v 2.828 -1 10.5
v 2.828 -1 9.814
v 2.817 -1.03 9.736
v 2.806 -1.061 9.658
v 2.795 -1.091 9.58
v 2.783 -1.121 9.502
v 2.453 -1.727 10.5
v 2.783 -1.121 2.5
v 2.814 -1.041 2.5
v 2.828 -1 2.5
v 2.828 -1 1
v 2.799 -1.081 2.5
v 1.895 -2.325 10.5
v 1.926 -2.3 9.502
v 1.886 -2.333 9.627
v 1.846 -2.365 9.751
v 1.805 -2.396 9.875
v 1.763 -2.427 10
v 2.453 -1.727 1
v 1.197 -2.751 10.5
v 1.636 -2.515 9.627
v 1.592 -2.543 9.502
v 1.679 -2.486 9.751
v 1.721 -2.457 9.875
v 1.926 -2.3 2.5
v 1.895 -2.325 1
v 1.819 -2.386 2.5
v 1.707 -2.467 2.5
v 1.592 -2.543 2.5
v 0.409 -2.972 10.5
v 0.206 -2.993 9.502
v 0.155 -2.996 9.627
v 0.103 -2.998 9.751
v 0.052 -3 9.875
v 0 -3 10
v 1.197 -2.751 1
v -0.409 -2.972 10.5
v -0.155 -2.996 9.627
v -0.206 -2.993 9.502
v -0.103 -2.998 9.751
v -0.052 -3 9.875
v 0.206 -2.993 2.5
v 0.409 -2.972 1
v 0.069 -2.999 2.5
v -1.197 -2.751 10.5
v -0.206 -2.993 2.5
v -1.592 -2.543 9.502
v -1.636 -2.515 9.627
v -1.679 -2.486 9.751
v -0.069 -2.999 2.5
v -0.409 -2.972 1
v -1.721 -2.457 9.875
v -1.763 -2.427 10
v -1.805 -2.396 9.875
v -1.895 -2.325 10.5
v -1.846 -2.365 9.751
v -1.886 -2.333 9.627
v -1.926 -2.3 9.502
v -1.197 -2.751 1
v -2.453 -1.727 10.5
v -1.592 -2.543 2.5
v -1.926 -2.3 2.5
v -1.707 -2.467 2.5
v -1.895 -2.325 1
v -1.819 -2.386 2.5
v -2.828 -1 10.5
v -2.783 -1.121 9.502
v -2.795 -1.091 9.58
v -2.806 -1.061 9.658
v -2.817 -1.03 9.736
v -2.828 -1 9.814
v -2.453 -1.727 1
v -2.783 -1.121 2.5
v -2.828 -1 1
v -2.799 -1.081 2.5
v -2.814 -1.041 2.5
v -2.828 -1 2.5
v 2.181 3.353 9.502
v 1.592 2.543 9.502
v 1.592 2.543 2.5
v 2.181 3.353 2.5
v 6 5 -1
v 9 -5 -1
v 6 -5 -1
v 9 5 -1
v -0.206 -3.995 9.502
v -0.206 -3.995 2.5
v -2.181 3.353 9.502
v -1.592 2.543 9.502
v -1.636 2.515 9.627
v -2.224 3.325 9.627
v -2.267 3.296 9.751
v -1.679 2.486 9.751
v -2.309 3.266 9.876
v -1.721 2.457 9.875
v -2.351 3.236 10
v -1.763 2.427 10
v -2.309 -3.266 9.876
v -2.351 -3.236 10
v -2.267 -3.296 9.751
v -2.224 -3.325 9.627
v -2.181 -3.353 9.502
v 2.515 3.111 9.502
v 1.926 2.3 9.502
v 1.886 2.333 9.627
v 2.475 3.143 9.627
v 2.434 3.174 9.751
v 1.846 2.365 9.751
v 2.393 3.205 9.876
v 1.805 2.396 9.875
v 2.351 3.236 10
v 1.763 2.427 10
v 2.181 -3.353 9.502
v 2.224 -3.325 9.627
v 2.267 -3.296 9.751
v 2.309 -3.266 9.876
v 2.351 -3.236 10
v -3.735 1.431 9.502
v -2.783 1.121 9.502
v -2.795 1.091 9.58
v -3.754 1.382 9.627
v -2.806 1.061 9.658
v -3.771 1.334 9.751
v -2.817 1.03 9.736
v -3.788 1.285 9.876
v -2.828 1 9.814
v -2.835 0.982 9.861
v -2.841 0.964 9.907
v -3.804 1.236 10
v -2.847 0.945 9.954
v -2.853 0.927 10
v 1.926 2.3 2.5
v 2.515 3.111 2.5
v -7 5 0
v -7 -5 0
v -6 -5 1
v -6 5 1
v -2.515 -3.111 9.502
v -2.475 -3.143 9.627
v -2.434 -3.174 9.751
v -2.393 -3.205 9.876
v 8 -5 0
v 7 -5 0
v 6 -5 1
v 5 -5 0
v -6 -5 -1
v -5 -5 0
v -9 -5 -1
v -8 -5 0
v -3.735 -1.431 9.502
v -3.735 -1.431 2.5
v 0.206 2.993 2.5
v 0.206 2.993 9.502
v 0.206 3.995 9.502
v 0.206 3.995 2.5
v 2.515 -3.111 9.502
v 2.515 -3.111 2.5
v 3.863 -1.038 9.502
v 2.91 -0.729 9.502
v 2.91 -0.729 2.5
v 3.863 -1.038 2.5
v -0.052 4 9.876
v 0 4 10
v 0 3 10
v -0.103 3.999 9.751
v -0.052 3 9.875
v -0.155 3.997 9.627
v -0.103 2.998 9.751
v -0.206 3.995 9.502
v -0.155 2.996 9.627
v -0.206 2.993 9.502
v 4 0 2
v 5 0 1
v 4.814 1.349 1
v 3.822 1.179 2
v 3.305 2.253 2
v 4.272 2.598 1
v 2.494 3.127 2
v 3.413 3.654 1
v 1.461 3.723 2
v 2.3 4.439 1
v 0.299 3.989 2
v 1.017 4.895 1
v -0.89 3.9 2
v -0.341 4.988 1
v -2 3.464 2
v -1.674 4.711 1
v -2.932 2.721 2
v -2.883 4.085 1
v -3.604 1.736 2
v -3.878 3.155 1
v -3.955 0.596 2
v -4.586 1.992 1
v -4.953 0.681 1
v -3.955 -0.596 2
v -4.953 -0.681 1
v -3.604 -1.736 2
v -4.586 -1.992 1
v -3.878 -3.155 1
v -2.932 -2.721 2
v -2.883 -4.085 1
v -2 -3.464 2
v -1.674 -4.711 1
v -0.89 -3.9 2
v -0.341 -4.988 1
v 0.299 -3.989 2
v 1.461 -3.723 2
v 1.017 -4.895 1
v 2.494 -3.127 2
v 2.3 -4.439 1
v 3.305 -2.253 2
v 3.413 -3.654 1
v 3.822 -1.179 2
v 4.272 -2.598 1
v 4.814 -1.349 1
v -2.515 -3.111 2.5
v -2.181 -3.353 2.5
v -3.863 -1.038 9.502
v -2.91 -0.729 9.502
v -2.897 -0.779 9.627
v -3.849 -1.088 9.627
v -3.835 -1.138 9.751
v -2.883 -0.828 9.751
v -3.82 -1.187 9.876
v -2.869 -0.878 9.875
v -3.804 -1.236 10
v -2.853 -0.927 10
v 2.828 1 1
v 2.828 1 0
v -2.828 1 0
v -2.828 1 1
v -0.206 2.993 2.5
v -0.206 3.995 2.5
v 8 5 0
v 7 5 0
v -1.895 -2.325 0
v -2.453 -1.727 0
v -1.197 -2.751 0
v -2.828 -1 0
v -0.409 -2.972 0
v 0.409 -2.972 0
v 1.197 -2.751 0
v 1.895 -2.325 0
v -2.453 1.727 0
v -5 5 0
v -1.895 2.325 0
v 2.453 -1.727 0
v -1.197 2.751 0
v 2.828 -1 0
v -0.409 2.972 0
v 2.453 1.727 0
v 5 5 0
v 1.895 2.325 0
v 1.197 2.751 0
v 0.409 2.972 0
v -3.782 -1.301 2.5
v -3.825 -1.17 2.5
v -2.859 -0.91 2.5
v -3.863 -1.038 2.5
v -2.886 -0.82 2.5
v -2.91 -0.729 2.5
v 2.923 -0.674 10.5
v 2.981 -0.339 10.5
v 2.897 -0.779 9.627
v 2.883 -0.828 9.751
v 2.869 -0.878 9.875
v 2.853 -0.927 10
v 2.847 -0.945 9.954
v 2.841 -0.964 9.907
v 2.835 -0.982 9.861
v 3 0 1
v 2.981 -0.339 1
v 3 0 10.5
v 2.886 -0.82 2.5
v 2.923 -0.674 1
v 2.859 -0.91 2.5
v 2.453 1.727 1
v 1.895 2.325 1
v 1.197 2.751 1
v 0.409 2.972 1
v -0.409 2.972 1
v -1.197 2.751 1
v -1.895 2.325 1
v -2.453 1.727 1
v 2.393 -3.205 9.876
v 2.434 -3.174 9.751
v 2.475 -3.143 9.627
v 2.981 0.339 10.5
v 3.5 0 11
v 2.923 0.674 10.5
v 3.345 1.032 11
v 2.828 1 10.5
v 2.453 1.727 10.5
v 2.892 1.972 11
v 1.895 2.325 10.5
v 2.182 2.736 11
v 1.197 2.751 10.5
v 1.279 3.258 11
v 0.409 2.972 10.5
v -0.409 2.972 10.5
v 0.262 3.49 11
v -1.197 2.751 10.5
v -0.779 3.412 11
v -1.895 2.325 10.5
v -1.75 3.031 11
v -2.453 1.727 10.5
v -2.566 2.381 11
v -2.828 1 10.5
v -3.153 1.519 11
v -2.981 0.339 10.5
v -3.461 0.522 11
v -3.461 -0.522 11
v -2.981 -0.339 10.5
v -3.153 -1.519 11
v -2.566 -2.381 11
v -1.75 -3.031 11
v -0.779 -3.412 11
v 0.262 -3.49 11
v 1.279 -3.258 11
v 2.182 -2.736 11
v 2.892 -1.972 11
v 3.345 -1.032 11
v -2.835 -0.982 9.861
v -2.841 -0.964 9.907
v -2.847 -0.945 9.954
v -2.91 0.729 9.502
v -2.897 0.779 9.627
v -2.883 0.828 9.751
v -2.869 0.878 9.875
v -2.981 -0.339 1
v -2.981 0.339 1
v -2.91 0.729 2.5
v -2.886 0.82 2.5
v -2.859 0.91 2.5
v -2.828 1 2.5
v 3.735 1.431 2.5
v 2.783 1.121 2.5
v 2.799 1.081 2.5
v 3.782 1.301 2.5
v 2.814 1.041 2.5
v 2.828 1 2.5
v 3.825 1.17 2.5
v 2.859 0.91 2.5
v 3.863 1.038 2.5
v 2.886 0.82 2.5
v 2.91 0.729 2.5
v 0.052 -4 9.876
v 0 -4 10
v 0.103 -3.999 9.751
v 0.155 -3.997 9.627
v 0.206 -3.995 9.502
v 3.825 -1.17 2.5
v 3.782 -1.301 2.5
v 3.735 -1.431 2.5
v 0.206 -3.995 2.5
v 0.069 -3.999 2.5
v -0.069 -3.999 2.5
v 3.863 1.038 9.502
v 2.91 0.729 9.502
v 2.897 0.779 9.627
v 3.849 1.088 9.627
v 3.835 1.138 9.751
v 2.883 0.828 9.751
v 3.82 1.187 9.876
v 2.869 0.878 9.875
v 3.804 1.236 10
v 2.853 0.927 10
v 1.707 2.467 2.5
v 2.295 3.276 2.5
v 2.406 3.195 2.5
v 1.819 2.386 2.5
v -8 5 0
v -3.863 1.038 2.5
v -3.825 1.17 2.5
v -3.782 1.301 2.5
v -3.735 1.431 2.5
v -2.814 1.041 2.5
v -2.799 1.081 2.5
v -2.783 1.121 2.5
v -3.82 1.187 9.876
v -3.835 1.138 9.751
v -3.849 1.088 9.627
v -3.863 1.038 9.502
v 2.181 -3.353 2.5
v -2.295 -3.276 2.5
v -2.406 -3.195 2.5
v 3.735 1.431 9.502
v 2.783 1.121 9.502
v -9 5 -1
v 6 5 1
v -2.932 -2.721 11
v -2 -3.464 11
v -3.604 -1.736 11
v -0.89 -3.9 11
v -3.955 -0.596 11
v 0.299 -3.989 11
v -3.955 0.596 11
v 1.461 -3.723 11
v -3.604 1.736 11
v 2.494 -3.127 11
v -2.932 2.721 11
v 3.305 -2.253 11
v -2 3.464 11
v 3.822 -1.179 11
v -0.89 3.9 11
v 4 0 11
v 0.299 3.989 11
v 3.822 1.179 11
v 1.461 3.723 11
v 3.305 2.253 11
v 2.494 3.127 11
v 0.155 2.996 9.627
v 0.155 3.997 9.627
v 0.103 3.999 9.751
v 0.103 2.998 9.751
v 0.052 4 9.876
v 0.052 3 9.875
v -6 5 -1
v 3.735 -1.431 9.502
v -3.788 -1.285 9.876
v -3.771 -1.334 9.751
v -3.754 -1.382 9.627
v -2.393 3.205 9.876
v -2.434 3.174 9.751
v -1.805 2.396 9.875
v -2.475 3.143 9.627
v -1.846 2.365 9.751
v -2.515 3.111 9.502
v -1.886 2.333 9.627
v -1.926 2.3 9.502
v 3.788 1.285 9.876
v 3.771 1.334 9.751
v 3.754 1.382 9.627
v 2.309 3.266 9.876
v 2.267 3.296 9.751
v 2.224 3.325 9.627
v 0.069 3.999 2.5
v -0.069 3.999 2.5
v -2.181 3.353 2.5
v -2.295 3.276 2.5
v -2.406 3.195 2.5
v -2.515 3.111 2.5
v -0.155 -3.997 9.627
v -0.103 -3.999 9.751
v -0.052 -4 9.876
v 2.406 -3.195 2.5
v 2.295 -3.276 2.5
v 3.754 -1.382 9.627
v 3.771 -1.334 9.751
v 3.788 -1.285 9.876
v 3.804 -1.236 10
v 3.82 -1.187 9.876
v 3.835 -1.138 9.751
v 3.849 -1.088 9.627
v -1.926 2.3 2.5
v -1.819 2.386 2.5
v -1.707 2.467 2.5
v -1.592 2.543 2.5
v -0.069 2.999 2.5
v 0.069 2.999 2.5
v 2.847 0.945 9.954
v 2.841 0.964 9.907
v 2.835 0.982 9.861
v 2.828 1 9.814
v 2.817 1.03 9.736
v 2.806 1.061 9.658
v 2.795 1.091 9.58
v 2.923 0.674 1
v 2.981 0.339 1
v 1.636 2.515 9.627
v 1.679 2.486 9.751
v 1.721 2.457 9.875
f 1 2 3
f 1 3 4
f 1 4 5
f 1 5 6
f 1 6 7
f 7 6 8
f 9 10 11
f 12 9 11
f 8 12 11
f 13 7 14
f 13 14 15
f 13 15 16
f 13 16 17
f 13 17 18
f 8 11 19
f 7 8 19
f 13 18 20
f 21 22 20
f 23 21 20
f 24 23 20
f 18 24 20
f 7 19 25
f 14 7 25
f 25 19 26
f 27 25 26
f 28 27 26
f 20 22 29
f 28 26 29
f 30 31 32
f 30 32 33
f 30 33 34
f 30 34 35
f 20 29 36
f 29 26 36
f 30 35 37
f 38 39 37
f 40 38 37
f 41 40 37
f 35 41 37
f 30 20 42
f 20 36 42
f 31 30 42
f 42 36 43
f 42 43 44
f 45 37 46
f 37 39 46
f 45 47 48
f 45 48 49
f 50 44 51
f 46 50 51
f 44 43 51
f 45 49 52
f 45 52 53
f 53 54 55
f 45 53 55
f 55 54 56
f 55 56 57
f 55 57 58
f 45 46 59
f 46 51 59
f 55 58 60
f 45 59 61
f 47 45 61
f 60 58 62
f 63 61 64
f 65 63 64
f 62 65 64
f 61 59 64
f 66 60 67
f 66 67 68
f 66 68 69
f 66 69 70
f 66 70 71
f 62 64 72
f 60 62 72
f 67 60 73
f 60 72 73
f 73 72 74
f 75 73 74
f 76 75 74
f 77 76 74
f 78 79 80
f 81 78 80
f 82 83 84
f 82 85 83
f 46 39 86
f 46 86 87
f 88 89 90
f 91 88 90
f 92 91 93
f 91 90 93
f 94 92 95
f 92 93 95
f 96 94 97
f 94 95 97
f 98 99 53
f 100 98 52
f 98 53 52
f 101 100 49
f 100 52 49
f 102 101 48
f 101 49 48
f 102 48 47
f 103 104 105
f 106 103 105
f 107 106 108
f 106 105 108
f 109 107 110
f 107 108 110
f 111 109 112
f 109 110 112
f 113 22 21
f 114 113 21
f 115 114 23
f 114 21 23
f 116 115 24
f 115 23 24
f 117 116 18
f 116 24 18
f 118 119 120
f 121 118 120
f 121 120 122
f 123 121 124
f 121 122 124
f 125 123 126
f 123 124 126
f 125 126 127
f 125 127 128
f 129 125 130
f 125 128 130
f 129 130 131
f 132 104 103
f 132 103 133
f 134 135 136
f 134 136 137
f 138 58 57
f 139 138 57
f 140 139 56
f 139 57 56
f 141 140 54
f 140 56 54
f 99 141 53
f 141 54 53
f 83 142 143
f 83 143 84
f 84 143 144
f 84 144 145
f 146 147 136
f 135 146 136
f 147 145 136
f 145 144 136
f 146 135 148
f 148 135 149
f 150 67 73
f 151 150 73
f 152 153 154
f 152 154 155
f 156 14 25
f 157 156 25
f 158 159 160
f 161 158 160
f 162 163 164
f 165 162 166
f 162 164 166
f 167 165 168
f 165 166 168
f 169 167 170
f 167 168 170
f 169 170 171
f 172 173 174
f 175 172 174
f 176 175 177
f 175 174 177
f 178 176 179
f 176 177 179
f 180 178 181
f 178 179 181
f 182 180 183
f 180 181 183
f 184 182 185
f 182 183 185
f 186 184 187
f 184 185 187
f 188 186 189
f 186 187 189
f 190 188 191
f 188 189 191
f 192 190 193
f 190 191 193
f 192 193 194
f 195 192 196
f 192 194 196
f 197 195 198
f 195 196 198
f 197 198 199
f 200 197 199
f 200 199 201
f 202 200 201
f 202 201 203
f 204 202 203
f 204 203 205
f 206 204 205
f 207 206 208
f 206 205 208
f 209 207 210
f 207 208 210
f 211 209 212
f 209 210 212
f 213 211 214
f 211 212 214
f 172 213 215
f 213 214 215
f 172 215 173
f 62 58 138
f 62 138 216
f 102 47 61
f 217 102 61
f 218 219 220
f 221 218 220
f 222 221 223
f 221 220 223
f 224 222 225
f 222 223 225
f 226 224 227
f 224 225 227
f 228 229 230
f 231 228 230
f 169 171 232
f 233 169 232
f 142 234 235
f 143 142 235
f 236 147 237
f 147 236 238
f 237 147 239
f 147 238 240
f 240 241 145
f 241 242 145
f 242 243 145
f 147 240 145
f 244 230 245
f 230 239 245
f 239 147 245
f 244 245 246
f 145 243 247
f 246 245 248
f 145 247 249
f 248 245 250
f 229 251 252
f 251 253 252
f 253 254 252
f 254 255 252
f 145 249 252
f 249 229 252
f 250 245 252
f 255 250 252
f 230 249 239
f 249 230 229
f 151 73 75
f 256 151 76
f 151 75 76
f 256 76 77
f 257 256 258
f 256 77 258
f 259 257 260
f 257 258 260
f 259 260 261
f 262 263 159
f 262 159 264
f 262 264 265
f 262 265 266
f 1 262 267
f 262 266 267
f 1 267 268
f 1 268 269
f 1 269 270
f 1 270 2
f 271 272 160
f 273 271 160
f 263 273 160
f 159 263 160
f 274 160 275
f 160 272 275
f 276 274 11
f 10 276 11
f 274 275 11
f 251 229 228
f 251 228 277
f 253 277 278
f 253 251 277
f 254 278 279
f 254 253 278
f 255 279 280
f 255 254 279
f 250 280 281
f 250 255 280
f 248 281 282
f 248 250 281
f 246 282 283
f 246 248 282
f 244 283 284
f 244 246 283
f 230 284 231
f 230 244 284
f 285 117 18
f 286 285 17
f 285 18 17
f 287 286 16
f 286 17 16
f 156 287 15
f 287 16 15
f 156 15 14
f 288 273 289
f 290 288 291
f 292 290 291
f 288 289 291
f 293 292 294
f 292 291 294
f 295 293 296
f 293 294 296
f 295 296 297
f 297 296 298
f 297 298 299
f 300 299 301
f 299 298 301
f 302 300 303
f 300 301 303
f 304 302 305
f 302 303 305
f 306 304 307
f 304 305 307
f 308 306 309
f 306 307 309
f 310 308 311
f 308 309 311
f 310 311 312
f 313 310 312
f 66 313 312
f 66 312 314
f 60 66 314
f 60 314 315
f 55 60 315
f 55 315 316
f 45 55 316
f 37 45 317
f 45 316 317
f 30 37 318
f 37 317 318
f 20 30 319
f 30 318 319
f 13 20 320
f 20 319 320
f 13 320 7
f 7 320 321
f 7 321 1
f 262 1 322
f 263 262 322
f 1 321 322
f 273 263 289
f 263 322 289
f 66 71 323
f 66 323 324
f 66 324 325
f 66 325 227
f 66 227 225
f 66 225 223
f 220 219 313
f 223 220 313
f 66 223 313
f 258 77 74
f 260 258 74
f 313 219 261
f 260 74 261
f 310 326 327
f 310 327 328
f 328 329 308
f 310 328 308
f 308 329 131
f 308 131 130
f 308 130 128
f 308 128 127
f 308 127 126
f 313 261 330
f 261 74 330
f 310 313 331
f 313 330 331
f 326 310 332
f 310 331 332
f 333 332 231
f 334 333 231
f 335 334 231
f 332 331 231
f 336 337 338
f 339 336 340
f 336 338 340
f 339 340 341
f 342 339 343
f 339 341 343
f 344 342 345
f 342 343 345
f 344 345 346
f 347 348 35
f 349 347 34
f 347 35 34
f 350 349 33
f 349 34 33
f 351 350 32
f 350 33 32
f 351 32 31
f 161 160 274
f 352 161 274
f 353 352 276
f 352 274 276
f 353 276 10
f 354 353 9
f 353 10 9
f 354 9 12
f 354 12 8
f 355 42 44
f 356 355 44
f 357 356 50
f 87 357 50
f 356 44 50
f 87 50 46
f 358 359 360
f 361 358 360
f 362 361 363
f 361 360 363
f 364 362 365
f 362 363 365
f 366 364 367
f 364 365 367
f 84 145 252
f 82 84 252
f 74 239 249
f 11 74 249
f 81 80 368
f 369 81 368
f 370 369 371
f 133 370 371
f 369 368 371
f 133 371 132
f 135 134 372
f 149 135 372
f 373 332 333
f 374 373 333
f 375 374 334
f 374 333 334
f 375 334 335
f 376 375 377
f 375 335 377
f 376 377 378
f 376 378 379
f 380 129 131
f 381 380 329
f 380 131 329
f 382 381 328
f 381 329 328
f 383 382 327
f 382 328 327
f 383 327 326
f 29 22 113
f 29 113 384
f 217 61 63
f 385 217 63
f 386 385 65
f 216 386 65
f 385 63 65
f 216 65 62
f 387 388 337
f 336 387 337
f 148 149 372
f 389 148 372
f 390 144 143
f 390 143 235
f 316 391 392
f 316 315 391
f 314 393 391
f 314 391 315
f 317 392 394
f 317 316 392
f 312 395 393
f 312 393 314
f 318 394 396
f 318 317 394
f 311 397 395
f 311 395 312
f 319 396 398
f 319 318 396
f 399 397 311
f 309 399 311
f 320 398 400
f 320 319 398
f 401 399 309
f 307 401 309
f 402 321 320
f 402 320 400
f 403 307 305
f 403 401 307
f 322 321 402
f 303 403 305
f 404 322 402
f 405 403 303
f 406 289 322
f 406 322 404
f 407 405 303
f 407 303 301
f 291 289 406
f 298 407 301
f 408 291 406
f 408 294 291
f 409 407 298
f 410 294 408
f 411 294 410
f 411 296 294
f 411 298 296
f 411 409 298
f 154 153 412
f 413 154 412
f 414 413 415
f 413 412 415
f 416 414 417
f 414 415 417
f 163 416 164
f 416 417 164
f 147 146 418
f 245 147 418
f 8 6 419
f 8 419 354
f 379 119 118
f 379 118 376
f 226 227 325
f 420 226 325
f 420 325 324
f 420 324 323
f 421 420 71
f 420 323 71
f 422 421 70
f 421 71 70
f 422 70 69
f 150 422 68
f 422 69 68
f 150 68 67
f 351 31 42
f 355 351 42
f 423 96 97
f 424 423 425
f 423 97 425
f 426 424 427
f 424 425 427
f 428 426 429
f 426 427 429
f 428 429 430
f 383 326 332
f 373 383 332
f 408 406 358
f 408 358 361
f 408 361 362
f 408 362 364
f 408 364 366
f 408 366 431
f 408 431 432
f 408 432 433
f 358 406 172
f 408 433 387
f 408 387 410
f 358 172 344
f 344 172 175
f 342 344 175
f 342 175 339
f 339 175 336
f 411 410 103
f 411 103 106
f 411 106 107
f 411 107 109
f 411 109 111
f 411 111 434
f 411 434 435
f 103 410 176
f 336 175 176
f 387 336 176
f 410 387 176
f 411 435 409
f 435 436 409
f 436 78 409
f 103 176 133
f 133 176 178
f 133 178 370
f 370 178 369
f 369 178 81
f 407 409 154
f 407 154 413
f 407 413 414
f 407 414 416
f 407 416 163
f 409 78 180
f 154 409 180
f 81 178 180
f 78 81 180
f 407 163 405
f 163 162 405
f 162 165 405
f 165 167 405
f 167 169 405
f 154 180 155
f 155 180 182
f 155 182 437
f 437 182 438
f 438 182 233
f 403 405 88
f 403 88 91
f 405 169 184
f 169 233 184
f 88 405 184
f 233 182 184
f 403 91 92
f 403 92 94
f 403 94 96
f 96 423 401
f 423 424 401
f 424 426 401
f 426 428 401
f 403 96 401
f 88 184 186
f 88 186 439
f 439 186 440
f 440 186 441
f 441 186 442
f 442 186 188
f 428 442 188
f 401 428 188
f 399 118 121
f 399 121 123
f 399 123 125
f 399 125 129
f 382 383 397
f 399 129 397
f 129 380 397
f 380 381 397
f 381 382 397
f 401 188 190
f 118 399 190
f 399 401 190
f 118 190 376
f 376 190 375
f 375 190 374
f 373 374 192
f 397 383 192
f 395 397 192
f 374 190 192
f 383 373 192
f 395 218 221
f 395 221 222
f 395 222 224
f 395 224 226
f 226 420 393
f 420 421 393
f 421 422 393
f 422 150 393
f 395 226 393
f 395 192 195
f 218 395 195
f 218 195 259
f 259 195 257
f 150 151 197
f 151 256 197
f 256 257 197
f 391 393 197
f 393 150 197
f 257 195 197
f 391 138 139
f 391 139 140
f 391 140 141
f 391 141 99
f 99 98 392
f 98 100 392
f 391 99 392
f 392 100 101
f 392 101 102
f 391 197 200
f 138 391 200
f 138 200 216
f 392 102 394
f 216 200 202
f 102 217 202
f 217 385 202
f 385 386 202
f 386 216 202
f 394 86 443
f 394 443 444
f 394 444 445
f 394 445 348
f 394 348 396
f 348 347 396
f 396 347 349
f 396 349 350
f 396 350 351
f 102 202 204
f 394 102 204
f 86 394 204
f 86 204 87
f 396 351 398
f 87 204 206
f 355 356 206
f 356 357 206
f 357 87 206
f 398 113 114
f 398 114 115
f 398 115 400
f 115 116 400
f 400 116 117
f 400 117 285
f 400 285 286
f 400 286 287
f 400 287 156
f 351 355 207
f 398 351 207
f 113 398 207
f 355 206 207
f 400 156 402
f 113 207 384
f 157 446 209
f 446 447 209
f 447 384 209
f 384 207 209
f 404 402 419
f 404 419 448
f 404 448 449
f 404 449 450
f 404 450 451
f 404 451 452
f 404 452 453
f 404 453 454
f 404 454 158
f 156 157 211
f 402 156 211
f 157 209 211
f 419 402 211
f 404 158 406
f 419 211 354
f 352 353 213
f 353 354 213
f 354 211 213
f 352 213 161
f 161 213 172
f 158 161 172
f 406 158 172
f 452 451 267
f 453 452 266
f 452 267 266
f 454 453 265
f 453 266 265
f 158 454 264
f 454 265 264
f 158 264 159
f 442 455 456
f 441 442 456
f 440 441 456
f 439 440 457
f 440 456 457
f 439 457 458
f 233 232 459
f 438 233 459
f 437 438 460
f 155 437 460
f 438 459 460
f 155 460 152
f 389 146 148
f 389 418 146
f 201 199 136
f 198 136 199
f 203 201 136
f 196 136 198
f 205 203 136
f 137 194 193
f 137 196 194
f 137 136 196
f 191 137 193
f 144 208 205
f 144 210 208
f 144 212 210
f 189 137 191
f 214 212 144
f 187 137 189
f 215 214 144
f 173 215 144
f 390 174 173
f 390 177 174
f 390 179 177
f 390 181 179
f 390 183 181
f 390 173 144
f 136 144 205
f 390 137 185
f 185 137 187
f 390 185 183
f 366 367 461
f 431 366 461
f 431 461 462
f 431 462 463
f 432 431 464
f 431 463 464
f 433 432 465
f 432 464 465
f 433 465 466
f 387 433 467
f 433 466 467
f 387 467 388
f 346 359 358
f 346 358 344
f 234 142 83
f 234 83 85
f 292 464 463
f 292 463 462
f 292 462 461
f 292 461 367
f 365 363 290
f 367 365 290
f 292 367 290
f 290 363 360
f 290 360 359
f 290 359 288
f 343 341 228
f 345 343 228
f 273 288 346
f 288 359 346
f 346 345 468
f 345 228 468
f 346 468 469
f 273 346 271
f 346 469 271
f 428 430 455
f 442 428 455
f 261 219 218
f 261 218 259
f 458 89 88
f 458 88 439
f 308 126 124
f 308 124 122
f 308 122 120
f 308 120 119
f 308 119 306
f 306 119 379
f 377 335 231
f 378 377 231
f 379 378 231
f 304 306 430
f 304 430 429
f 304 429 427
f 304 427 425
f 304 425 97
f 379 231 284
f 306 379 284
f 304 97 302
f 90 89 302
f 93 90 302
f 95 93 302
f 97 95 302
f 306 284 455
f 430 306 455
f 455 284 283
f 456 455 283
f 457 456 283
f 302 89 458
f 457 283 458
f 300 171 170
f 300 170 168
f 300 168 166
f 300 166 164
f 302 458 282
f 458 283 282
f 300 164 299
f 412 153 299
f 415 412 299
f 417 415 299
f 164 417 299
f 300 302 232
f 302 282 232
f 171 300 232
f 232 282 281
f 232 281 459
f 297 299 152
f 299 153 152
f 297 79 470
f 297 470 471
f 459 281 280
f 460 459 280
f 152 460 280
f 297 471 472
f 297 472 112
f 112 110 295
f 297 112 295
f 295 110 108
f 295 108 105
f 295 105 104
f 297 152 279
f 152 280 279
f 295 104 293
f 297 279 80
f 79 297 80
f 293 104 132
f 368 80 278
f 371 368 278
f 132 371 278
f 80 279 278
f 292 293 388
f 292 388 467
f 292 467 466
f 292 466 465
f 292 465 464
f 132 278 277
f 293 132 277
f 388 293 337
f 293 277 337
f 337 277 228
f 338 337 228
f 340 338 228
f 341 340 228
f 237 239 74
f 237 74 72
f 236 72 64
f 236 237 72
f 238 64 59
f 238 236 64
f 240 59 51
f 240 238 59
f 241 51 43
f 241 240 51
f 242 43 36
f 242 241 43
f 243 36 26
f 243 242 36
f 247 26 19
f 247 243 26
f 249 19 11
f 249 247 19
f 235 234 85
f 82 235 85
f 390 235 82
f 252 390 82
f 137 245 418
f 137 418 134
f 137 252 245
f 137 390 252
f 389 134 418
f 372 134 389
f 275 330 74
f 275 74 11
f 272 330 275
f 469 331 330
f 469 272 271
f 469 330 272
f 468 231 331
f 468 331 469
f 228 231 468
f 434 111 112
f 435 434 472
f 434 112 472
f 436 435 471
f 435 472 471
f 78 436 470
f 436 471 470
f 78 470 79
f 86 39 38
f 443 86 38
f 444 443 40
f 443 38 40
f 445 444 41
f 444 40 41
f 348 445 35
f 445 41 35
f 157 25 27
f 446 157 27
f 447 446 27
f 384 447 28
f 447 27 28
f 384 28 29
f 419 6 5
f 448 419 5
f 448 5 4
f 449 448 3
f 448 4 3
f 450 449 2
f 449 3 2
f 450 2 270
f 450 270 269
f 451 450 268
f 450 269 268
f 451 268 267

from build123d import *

# Parameters (mm, degrees)
ESQUISSE1_W                  = 10
ESQUISSE1_H                  = 10
ESQUISSE1_R                  = 4
ESQUISSE1_R_2                = 3
ESQUISSE1_W_2                = 1
BOSS_EXTRU_1_DEPTH           = 1
ESQUISSE2_R                  = 4
BOSS_EXTRU_2_DEPTH           = 10
CHANFREIN1_SIZE              = 1
ENL_V_MAT_EXTRU_1_REACH      = 15.491
ENL_V_MAT_EXTRU_1_END_RADIUS = 4
ESQUISSE3_W                  = 0.41236409
ESQUISSE3_H                  = 6.00446502
ESQUISSE3_H_2                = 0.99776749
R_P_TITION_CIRCULAIRE1_COUNT = 10
ESQUISSE9_W                  = 4
ESQUISSE9_H                  = 10
BOSS_EXTRU_8_DEPTH           = 1
CHANFREIN2_SIZE              = 1


with BuildPart() as part:
    # Esquisse1 → Boss.-Extru.1 (new body)
    # profile 1 of 5: a face of its own
    with BuildSketch(Plane.XY):
        Rectangle(ESQUISSE1_W, ESQUISSE1_H)
        Circle(ESQUISSE1_R, mode=Mode.SUBTRACT)
    # profile 2 of 5: a face of its own
    with BuildSketch(Plane.XY):
        Circle(ESQUISSE1_R)
        Circle(ESQUISSE1_R_2, mode=Mode.SUBTRACT)
    # profile 3 of 5: a face of its own
    with BuildSketch(Plane.XY):
        with BuildLine():
            Line((2.828427125, 1), (-2.828427125, 1))
            ThreePointArc((-2.828427125, 1), (-3, 0), (-2.828427125, -1))
            Line((-2.828427125, -1), (2.828427125, -1))
            ThreePointArc((2.828427125, -1), (2.956795679, -0.507305936), (3, 0))
            ThreePointArc((3, 0), (2.956795679, 0.507305936), (2.828427125, 1))
        make_face()
    # profile 4 of 5: a face of its own
    with BuildSketch(Plane.XY):
        with Locations((-5.5, 0)):
            Rectangle(ESQUISSE1_W_2, ESQUISSE1_H)
    # profile 5 of 5: a face of its own
    with BuildSketch(Plane.XY):
        with Locations((5.5, 0)):
            Rectangle(ESQUISSE1_W_2, ESQUISSE1_H)
    extrude(amount=BOSS_EXTRU_1_DEPTH)

    # Esquisse2 → Boss.-Extru.2 (add)
    with BuildSketch(Plane.XY.offset(1)):
        Circle(ESQUISSE2_R)
        with BuildLine():
            ThreePointArc((2.828427125, 1), (2.956795679, 0.507305936), (3, 0))
            ThreePointArc((3, 0), (2.956795679, -0.507305936), (2.828427125, -1))
            ThreePointArc((2.828427125, -1), (0, -3), (-2.828427125, -1))
            ThreePointArc((-2.828427125, -1), (-3, 0), (-2.828427125, 1))
            ThreePointArc((-2.828427125, 1), (0, 3), (2.828427125, 1))
        make_face(mode=Mode.SUBTRACT)
    extrude(amount=BOSS_EXTRU_2_DEPTH)

    # Chanfrein1
    chanfrein1_edges = [part.edges().sort_by_distance(p)[0] for p in [
        (-4, 0, 1),
    ]]
    chamfer(chanfrein1_edges, length=CHANFREIN1_SIZE - 0.0001)  # a hair under: the kernel refuses the full size

    # Enlèv. mat.-Extru.1: up to this cylinder (the profile starts inside it)
    enl_v_mat_extru_1_end = Plane(origin=(0, 0, 6.3335195), z_dir=(0, 0, -1)) * Cylinder(ENL_V_MAT_EXTRU_1_END_RADIUS, 46.651271, mode=Mode.PRIVATE)
    # Esquisse3 → Enlèv. mat.-Extru.1 (cut, up to the surface)
    with BuildSketch(Plane(origin=(0, 0, 0), x_dir=(1, 0, 0), z_dir=(0, 1, 0)), mode=Mode.PRIVATE) as enl_v_mat_extru_1_sk1:
        with Locations((0, -6.5)):
            Rectangle(ESQUISSE3_W, ESQUISSE3_H)
    enl_v_mat_extru_1_tool1 = extrude(enl_v_mat_extru_1_sk1.sketch, amount=ENL_V_MAT_EXTRU_1_REACH, mode=Mode.PRIVATE) & enl_v_mat_extru_1_end
    # Esquisse3 → Enlèv. mat.-Extru.1 (cut, up to the surface)
    with BuildSketch(Plane(origin=(0, 0, 0), x_dir=(1, 0, 0), z_dir=(0, 1, 0)), mode=Mode.PRIVATE) as enl_v_mat_extru_1_sk2:
        with Locations((0, -2.998883745)):
            Rectangle(ESQUISSE3_W, ESQUISSE3_H_2)
    enl_v_mat_extru_1_tool2 = extrude(enl_v_mat_extru_1_sk2.sketch, amount=ENL_V_MAT_EXTRU_1_REACH, mode=Mode.PRIVATE) & enl_v_mat_extru_1_end
    # Esquisse3 → Enlèv. mat.-Extru.1 (cut, up to the surface)
    with BuildSketch(Plane(origin=(0, 0, 0), x_dir=(1, 0, 0), z_dir=(0, 1, 0)), mode=Mode.PRIVATE) as enl_v_mat_extru_1_sk3:
        Polygon((-0.206182045, -9.50223251), (0.206182045, -9.50223251), (0, -10), align=None)
    enl_v_mat_extru_1_tool3 = extrude(enl_v_mat_extru_1_sk3.sketch, amount=ENL_V_MAT_EXTRU_1_REACH, mode=Mode.PRIVATE) & enl_v_mat_extru_1_end
    enl_v_mat_extru_1 = enl_v_mat_extru_1_tool1.solids().sort_by_distance((0, 0, 6.5))[0] + enl_v_mat_extru_1_tool2.solids().sort_by_distance((0, 0, 2.998884))[0] + enl_v_mat_extru_1_tool3.solids().sort_by_distance((0, 0, 9.668155))[0]
    add(enl_v_mat_extru_1, mode=Mode.SUBTRACT)

    # Répétition circulaire1: Enlèv. mat.-Extru.1 ×10 about axis
    r_p_tition_circulaire1_axis = Axis((0, 0, 0), (0, 0, 1))
    for i in range(1, R_P_TITION_CIRCULAIRE1_COUNT):
        add(enl_v_mat_extru_1.rotate(r_p_tition_circulaire1_axis, i * 360 / R_P_TITION_CIRCULAIRE1_COUNT), mode=Mode.SUBTRACT)

    # Esquisse9 → Boss.-Extru.8 (add)
    with BuildSketch(Plane(origin=(0, 0, 0), x_dir=(-1, 0, 0), z_dir=(0, 0, -1))):
        with Locations((-7, 0)):
            Rectangle(ESQUISSE9_W, ESQUISSE9_H)
        with Locations((7, 0)):
            Rectangle(ESQUISSE9_W, ESQUISSE9_H)
    extrude(amount=BOSS_EXTRU_8_DEPTH)

    # Chanfrein2
    chanfrein2_edges = [part.edges().sort_by_distance(p)[0] for p in [
        (6, 0, 0),
        (5, 0, -1),
        (-6, 0, 0),
        (-5, 0, -1),
        (-9, 0, 0),
        (9, 0, 0),
    ]]
    chamfer(chanfrein2_edges, length=CHANFREIN2_SIZE - 0.0001)  # a hair under: the kernel refuses the full size

    # Chanfrein3: read off the stored shape, not the designer's step
    # Chanfrein3 outline → Chanfrein3 (revolve, cut)
    with BuildSketch(Plane.XZ):
        Polygon((3, 11), (3, 10.5), (3.5, 11), align=None)
    revolve(axis=Axis((0, 0, 0), (0, 0, 1)), mode=Mode.SUBTRACT)


solid = part.part
